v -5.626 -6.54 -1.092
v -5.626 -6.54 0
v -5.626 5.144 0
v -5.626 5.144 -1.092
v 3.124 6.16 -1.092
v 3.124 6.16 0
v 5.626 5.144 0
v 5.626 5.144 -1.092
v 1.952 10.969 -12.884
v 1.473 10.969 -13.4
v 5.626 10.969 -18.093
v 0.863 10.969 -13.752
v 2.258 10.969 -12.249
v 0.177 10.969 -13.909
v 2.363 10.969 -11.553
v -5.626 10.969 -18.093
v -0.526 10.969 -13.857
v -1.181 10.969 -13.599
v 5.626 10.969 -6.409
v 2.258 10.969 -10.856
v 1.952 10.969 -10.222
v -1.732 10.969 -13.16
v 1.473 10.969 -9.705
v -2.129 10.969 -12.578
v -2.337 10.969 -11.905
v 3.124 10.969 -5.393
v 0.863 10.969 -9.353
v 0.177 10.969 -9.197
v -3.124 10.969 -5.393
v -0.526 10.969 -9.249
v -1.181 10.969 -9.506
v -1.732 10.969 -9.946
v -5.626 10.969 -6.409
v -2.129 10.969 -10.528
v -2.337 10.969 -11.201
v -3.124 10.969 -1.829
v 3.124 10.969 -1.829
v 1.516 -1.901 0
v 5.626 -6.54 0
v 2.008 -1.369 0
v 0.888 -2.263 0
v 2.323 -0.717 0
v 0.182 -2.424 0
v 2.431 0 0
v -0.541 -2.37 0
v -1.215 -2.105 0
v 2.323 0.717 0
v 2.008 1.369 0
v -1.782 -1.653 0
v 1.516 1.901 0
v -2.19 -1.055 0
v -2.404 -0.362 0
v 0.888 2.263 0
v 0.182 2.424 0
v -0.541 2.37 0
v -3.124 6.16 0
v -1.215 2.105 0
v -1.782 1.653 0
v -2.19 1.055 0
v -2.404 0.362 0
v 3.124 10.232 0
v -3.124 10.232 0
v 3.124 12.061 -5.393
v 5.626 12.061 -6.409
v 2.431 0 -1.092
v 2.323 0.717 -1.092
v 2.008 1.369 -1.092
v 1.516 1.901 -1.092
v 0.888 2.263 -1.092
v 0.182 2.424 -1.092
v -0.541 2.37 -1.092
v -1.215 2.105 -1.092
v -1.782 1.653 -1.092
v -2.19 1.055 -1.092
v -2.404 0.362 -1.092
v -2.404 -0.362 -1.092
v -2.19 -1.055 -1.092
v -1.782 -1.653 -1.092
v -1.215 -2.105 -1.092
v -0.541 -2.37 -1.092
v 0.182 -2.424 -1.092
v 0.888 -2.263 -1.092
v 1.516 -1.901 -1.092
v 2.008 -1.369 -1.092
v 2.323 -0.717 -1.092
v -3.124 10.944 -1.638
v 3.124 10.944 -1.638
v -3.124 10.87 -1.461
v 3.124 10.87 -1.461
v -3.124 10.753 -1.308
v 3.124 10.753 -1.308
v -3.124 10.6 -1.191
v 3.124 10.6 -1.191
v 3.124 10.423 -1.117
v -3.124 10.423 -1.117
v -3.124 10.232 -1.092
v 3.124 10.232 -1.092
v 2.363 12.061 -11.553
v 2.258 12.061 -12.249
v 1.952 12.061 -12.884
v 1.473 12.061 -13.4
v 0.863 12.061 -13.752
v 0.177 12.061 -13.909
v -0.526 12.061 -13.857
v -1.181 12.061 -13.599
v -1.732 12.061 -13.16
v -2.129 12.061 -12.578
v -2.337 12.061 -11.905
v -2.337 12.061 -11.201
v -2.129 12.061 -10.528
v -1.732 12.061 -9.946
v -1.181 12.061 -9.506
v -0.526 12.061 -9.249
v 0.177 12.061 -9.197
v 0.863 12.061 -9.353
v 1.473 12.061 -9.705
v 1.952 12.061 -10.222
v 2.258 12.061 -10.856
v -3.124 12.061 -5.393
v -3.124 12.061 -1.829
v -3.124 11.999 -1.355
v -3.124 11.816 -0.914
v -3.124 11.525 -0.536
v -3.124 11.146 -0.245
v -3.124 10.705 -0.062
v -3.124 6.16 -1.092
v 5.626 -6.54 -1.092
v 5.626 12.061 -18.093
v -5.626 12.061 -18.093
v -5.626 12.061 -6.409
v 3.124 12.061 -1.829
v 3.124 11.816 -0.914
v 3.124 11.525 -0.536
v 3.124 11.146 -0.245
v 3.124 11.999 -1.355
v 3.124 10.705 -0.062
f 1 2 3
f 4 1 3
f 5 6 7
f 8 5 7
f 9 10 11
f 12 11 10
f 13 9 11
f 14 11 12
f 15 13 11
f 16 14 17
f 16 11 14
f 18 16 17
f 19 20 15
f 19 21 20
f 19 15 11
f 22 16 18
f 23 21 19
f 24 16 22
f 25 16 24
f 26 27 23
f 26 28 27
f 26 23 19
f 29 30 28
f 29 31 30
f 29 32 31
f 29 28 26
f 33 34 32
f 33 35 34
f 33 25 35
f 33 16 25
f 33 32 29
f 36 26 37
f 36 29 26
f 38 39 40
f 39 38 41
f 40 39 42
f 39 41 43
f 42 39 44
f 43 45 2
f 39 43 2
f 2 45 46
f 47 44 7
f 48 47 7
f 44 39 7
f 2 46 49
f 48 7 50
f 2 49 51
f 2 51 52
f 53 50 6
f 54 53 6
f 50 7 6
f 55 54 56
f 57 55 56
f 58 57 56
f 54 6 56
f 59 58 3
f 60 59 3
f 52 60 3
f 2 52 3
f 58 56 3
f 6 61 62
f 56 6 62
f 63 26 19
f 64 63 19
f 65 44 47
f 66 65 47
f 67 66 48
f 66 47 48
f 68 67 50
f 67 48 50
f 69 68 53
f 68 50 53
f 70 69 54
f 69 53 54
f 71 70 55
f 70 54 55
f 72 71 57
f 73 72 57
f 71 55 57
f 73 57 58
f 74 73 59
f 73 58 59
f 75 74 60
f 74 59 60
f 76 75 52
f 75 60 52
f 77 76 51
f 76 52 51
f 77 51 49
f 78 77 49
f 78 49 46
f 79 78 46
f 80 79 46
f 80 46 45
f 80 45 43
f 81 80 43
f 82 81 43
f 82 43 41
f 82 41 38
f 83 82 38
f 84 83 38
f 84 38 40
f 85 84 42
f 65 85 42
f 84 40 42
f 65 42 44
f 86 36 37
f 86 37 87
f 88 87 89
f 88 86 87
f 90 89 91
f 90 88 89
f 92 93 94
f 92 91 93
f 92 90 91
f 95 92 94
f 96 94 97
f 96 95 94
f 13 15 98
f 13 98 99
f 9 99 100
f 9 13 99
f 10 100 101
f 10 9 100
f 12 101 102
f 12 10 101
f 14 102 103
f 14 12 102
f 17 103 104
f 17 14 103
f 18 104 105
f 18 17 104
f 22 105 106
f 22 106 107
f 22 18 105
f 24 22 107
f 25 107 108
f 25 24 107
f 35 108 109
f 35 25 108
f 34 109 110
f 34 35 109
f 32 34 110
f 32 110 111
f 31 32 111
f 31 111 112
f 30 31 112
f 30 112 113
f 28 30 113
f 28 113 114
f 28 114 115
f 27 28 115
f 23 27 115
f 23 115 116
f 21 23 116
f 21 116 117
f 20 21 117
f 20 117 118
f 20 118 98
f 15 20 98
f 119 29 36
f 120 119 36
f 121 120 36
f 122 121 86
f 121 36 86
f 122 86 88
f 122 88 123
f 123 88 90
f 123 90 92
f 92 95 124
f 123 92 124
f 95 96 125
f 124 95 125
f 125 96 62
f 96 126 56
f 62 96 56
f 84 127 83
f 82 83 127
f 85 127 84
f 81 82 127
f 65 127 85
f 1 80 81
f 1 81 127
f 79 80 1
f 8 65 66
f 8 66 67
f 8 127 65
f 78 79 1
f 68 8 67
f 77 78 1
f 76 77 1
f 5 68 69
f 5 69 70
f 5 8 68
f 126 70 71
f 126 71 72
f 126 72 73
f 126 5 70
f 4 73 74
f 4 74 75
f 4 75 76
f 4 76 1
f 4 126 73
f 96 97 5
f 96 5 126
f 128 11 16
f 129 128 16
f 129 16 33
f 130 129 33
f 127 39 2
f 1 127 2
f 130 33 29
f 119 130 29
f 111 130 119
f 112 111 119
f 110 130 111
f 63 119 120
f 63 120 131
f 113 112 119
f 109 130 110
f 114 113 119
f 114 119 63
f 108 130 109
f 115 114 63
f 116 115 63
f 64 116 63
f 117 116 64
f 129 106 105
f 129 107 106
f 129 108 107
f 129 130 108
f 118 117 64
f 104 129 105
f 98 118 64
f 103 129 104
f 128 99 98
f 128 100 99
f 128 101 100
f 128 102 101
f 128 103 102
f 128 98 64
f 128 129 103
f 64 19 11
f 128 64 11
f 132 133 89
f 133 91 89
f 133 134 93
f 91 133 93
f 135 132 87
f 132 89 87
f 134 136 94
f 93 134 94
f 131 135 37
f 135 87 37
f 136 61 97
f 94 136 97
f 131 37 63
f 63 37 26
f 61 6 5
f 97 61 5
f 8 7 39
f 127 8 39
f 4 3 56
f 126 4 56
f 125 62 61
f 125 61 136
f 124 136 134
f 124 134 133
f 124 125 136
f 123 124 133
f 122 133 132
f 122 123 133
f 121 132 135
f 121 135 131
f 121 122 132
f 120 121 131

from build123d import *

# Parameters (mm, degrees)
SKETCH1_R                  = 2.430870735
SKETCH1_R_2                = 2.36295848
BASE_FLANGE1_DEPTH         = 1.0922
SKETCHED_START             = 12.060869776
SKETCHED_BEND3_OUTLINE_W   = 11.2522
SKETCHED_BEND3_OUTLINE_H   = 1.0922
SKETCHED_BEND3_DEPTH       = 16.450630224
SKETCHED_START_2           = 10.968669776
SKETCHED_BEND3_2_OUTLINE_R = 2.36295848
SKETCHED_BEND3_2_DEPTH     = 0.899042144
SKETCHED_START_3           = 10.232069776
SKETCHED_BEND3_3_OUTLINE_R = 2.36295848
SKETCHED_BEND3_3_DEPTH     = 1.8288
SKETCHED_START_4           = -5.6261
SKETCHED_BEND3_4_DEPTH     = 11.2522


with BuildPart() as part:
    # Base-Flange1: sheet metal written as solids
    # Sketch1 → Base-Flange1 (new body)
    with BuildSketch(Plane.XY):
        Polygon((-5.6261, 28.5115), (5.6261, 28.5115), (5.6261, 16.8275), (3.1242, 15.8115), (3.1242, 6.1595), (5.6261, 5.1435), (5.6261, -6.5405), (-5.6261, -6.5405), (-5.6261, 5.1435), (-3.1242, 6.1595), (-3.1242, 15.8115), (-5.6261, 16.8275), align=None)
        Circle(SKETCH1_R, mode=Mode.SUBTRACT)
        with Locations((0, 21.971)):
            Circle(SKETCH1_R_2, mode=Mode.SUBTRACT)
    extrude(amount=-BASE_FLANGE1_DEPTH)

    # Sketched Bend3: read off the stored shape, not the designer's step
    # Sketched Bend3 outline → Sketched Bend3 (cut)
    with BuildSketch(Plane(origin=(0, 0, 0), x_dir=(1, 0, 0), z_dir=(0, 1, 0)).offset(SKETCHED_START)):
        with Locations((0, 0.5461)):
            Rectangle(SKETCHED_BEND3_OUTLINE_W, SKETCHED_BEND3_OUTLINE_H)
    extrude(amount=SKETCHED_BEND3_DEPTH, mode=Mode.SUBTRACT)

    # Sketched Bend3 2 outline → Sketched Bend3 2 (add)
    with BuildSketch(Plane(origin=(0, 0, 0), x_dir=(1, 0, 0), z_dir=(0, 1, 0)).offset(SKETCHED_START_2)):
        Polygon((5.6261, 18.093369776), (-5.6261, 18.093369776), (-5.6261, 6.409369776), (-3.1242, 5.393369776), (-3.1242, 1.0922), (3.1242, 1.0922), (3.1242, 5.393369776), (5.6261, 6.409369776), align=None)
        with Locations((0, 11.552869776)):
            Circle(SKETCHED_BEND3_2_OUTLINE_R, mode=Mode.SUBTRACT)
    extrude(amount=SKETCHED_BEND3_2_DEPTH)

    # Sketched Bend3 3 outline → Sketched Bend3 3 (add)
    with BuildSketch(Plane(origin=(0, 0, 0), x_dir=(1, 0, 0), z_dir=(0, 1, 0)).offset(SKETCHED_START_3)):
        Polygon((5.6261, 18.093369776), (-5.6261, 18.093369776), (-5.6261, 6.409369776), (-3.1242, 5.393369776), (-3.1242, 1.0922), (3.1242, 1.0922), (3.1242, 5.393369776), (5.6261, 6.409369776), align=None)
        with Locations((0, 11.552869776)):
            Circle(SKETCHED_BEND3_3_OUTLINE_R, mode=Mode.SUBTRACT)
    extrude(amount=SKETCHED_BEND3_3_DEPTH)

    # Sketched Bend3 4 outline → Sketched Bend3 4 (cut)
    with BuildSketch(Plane.YZ.offset(SKETCHED_START_4)):
        with BuildLine():
            ThreePointArc((10.232069776, 0), (11.525226657, -0.535643119), (12.060869776, -1.8288))
            Line((12.060869776, -1.8288), (12.060869776, 0))
            Line((12.060869776, 0), (10.232069776, 0))
        make_face()
        with BuildLine():
            Line((10.968669776, -18.093369776), (10.968669776, -1.8288))
            ThreePointArc((10.968669776, -1.8288), (10.752924631, -1.307945145), (10.232069776, -1.0922))
            Line((10.232069776, -1.0922), (10.232069776, -18.093369776))
            Line((10.232069776, -18.093369776), (10.968669776, -18.093369776))
        make_face()
    extrude(amount=SKETCHED_BEND3_4_DEPTH, mode=Mode.SUBTRACT)


solid = part.part
